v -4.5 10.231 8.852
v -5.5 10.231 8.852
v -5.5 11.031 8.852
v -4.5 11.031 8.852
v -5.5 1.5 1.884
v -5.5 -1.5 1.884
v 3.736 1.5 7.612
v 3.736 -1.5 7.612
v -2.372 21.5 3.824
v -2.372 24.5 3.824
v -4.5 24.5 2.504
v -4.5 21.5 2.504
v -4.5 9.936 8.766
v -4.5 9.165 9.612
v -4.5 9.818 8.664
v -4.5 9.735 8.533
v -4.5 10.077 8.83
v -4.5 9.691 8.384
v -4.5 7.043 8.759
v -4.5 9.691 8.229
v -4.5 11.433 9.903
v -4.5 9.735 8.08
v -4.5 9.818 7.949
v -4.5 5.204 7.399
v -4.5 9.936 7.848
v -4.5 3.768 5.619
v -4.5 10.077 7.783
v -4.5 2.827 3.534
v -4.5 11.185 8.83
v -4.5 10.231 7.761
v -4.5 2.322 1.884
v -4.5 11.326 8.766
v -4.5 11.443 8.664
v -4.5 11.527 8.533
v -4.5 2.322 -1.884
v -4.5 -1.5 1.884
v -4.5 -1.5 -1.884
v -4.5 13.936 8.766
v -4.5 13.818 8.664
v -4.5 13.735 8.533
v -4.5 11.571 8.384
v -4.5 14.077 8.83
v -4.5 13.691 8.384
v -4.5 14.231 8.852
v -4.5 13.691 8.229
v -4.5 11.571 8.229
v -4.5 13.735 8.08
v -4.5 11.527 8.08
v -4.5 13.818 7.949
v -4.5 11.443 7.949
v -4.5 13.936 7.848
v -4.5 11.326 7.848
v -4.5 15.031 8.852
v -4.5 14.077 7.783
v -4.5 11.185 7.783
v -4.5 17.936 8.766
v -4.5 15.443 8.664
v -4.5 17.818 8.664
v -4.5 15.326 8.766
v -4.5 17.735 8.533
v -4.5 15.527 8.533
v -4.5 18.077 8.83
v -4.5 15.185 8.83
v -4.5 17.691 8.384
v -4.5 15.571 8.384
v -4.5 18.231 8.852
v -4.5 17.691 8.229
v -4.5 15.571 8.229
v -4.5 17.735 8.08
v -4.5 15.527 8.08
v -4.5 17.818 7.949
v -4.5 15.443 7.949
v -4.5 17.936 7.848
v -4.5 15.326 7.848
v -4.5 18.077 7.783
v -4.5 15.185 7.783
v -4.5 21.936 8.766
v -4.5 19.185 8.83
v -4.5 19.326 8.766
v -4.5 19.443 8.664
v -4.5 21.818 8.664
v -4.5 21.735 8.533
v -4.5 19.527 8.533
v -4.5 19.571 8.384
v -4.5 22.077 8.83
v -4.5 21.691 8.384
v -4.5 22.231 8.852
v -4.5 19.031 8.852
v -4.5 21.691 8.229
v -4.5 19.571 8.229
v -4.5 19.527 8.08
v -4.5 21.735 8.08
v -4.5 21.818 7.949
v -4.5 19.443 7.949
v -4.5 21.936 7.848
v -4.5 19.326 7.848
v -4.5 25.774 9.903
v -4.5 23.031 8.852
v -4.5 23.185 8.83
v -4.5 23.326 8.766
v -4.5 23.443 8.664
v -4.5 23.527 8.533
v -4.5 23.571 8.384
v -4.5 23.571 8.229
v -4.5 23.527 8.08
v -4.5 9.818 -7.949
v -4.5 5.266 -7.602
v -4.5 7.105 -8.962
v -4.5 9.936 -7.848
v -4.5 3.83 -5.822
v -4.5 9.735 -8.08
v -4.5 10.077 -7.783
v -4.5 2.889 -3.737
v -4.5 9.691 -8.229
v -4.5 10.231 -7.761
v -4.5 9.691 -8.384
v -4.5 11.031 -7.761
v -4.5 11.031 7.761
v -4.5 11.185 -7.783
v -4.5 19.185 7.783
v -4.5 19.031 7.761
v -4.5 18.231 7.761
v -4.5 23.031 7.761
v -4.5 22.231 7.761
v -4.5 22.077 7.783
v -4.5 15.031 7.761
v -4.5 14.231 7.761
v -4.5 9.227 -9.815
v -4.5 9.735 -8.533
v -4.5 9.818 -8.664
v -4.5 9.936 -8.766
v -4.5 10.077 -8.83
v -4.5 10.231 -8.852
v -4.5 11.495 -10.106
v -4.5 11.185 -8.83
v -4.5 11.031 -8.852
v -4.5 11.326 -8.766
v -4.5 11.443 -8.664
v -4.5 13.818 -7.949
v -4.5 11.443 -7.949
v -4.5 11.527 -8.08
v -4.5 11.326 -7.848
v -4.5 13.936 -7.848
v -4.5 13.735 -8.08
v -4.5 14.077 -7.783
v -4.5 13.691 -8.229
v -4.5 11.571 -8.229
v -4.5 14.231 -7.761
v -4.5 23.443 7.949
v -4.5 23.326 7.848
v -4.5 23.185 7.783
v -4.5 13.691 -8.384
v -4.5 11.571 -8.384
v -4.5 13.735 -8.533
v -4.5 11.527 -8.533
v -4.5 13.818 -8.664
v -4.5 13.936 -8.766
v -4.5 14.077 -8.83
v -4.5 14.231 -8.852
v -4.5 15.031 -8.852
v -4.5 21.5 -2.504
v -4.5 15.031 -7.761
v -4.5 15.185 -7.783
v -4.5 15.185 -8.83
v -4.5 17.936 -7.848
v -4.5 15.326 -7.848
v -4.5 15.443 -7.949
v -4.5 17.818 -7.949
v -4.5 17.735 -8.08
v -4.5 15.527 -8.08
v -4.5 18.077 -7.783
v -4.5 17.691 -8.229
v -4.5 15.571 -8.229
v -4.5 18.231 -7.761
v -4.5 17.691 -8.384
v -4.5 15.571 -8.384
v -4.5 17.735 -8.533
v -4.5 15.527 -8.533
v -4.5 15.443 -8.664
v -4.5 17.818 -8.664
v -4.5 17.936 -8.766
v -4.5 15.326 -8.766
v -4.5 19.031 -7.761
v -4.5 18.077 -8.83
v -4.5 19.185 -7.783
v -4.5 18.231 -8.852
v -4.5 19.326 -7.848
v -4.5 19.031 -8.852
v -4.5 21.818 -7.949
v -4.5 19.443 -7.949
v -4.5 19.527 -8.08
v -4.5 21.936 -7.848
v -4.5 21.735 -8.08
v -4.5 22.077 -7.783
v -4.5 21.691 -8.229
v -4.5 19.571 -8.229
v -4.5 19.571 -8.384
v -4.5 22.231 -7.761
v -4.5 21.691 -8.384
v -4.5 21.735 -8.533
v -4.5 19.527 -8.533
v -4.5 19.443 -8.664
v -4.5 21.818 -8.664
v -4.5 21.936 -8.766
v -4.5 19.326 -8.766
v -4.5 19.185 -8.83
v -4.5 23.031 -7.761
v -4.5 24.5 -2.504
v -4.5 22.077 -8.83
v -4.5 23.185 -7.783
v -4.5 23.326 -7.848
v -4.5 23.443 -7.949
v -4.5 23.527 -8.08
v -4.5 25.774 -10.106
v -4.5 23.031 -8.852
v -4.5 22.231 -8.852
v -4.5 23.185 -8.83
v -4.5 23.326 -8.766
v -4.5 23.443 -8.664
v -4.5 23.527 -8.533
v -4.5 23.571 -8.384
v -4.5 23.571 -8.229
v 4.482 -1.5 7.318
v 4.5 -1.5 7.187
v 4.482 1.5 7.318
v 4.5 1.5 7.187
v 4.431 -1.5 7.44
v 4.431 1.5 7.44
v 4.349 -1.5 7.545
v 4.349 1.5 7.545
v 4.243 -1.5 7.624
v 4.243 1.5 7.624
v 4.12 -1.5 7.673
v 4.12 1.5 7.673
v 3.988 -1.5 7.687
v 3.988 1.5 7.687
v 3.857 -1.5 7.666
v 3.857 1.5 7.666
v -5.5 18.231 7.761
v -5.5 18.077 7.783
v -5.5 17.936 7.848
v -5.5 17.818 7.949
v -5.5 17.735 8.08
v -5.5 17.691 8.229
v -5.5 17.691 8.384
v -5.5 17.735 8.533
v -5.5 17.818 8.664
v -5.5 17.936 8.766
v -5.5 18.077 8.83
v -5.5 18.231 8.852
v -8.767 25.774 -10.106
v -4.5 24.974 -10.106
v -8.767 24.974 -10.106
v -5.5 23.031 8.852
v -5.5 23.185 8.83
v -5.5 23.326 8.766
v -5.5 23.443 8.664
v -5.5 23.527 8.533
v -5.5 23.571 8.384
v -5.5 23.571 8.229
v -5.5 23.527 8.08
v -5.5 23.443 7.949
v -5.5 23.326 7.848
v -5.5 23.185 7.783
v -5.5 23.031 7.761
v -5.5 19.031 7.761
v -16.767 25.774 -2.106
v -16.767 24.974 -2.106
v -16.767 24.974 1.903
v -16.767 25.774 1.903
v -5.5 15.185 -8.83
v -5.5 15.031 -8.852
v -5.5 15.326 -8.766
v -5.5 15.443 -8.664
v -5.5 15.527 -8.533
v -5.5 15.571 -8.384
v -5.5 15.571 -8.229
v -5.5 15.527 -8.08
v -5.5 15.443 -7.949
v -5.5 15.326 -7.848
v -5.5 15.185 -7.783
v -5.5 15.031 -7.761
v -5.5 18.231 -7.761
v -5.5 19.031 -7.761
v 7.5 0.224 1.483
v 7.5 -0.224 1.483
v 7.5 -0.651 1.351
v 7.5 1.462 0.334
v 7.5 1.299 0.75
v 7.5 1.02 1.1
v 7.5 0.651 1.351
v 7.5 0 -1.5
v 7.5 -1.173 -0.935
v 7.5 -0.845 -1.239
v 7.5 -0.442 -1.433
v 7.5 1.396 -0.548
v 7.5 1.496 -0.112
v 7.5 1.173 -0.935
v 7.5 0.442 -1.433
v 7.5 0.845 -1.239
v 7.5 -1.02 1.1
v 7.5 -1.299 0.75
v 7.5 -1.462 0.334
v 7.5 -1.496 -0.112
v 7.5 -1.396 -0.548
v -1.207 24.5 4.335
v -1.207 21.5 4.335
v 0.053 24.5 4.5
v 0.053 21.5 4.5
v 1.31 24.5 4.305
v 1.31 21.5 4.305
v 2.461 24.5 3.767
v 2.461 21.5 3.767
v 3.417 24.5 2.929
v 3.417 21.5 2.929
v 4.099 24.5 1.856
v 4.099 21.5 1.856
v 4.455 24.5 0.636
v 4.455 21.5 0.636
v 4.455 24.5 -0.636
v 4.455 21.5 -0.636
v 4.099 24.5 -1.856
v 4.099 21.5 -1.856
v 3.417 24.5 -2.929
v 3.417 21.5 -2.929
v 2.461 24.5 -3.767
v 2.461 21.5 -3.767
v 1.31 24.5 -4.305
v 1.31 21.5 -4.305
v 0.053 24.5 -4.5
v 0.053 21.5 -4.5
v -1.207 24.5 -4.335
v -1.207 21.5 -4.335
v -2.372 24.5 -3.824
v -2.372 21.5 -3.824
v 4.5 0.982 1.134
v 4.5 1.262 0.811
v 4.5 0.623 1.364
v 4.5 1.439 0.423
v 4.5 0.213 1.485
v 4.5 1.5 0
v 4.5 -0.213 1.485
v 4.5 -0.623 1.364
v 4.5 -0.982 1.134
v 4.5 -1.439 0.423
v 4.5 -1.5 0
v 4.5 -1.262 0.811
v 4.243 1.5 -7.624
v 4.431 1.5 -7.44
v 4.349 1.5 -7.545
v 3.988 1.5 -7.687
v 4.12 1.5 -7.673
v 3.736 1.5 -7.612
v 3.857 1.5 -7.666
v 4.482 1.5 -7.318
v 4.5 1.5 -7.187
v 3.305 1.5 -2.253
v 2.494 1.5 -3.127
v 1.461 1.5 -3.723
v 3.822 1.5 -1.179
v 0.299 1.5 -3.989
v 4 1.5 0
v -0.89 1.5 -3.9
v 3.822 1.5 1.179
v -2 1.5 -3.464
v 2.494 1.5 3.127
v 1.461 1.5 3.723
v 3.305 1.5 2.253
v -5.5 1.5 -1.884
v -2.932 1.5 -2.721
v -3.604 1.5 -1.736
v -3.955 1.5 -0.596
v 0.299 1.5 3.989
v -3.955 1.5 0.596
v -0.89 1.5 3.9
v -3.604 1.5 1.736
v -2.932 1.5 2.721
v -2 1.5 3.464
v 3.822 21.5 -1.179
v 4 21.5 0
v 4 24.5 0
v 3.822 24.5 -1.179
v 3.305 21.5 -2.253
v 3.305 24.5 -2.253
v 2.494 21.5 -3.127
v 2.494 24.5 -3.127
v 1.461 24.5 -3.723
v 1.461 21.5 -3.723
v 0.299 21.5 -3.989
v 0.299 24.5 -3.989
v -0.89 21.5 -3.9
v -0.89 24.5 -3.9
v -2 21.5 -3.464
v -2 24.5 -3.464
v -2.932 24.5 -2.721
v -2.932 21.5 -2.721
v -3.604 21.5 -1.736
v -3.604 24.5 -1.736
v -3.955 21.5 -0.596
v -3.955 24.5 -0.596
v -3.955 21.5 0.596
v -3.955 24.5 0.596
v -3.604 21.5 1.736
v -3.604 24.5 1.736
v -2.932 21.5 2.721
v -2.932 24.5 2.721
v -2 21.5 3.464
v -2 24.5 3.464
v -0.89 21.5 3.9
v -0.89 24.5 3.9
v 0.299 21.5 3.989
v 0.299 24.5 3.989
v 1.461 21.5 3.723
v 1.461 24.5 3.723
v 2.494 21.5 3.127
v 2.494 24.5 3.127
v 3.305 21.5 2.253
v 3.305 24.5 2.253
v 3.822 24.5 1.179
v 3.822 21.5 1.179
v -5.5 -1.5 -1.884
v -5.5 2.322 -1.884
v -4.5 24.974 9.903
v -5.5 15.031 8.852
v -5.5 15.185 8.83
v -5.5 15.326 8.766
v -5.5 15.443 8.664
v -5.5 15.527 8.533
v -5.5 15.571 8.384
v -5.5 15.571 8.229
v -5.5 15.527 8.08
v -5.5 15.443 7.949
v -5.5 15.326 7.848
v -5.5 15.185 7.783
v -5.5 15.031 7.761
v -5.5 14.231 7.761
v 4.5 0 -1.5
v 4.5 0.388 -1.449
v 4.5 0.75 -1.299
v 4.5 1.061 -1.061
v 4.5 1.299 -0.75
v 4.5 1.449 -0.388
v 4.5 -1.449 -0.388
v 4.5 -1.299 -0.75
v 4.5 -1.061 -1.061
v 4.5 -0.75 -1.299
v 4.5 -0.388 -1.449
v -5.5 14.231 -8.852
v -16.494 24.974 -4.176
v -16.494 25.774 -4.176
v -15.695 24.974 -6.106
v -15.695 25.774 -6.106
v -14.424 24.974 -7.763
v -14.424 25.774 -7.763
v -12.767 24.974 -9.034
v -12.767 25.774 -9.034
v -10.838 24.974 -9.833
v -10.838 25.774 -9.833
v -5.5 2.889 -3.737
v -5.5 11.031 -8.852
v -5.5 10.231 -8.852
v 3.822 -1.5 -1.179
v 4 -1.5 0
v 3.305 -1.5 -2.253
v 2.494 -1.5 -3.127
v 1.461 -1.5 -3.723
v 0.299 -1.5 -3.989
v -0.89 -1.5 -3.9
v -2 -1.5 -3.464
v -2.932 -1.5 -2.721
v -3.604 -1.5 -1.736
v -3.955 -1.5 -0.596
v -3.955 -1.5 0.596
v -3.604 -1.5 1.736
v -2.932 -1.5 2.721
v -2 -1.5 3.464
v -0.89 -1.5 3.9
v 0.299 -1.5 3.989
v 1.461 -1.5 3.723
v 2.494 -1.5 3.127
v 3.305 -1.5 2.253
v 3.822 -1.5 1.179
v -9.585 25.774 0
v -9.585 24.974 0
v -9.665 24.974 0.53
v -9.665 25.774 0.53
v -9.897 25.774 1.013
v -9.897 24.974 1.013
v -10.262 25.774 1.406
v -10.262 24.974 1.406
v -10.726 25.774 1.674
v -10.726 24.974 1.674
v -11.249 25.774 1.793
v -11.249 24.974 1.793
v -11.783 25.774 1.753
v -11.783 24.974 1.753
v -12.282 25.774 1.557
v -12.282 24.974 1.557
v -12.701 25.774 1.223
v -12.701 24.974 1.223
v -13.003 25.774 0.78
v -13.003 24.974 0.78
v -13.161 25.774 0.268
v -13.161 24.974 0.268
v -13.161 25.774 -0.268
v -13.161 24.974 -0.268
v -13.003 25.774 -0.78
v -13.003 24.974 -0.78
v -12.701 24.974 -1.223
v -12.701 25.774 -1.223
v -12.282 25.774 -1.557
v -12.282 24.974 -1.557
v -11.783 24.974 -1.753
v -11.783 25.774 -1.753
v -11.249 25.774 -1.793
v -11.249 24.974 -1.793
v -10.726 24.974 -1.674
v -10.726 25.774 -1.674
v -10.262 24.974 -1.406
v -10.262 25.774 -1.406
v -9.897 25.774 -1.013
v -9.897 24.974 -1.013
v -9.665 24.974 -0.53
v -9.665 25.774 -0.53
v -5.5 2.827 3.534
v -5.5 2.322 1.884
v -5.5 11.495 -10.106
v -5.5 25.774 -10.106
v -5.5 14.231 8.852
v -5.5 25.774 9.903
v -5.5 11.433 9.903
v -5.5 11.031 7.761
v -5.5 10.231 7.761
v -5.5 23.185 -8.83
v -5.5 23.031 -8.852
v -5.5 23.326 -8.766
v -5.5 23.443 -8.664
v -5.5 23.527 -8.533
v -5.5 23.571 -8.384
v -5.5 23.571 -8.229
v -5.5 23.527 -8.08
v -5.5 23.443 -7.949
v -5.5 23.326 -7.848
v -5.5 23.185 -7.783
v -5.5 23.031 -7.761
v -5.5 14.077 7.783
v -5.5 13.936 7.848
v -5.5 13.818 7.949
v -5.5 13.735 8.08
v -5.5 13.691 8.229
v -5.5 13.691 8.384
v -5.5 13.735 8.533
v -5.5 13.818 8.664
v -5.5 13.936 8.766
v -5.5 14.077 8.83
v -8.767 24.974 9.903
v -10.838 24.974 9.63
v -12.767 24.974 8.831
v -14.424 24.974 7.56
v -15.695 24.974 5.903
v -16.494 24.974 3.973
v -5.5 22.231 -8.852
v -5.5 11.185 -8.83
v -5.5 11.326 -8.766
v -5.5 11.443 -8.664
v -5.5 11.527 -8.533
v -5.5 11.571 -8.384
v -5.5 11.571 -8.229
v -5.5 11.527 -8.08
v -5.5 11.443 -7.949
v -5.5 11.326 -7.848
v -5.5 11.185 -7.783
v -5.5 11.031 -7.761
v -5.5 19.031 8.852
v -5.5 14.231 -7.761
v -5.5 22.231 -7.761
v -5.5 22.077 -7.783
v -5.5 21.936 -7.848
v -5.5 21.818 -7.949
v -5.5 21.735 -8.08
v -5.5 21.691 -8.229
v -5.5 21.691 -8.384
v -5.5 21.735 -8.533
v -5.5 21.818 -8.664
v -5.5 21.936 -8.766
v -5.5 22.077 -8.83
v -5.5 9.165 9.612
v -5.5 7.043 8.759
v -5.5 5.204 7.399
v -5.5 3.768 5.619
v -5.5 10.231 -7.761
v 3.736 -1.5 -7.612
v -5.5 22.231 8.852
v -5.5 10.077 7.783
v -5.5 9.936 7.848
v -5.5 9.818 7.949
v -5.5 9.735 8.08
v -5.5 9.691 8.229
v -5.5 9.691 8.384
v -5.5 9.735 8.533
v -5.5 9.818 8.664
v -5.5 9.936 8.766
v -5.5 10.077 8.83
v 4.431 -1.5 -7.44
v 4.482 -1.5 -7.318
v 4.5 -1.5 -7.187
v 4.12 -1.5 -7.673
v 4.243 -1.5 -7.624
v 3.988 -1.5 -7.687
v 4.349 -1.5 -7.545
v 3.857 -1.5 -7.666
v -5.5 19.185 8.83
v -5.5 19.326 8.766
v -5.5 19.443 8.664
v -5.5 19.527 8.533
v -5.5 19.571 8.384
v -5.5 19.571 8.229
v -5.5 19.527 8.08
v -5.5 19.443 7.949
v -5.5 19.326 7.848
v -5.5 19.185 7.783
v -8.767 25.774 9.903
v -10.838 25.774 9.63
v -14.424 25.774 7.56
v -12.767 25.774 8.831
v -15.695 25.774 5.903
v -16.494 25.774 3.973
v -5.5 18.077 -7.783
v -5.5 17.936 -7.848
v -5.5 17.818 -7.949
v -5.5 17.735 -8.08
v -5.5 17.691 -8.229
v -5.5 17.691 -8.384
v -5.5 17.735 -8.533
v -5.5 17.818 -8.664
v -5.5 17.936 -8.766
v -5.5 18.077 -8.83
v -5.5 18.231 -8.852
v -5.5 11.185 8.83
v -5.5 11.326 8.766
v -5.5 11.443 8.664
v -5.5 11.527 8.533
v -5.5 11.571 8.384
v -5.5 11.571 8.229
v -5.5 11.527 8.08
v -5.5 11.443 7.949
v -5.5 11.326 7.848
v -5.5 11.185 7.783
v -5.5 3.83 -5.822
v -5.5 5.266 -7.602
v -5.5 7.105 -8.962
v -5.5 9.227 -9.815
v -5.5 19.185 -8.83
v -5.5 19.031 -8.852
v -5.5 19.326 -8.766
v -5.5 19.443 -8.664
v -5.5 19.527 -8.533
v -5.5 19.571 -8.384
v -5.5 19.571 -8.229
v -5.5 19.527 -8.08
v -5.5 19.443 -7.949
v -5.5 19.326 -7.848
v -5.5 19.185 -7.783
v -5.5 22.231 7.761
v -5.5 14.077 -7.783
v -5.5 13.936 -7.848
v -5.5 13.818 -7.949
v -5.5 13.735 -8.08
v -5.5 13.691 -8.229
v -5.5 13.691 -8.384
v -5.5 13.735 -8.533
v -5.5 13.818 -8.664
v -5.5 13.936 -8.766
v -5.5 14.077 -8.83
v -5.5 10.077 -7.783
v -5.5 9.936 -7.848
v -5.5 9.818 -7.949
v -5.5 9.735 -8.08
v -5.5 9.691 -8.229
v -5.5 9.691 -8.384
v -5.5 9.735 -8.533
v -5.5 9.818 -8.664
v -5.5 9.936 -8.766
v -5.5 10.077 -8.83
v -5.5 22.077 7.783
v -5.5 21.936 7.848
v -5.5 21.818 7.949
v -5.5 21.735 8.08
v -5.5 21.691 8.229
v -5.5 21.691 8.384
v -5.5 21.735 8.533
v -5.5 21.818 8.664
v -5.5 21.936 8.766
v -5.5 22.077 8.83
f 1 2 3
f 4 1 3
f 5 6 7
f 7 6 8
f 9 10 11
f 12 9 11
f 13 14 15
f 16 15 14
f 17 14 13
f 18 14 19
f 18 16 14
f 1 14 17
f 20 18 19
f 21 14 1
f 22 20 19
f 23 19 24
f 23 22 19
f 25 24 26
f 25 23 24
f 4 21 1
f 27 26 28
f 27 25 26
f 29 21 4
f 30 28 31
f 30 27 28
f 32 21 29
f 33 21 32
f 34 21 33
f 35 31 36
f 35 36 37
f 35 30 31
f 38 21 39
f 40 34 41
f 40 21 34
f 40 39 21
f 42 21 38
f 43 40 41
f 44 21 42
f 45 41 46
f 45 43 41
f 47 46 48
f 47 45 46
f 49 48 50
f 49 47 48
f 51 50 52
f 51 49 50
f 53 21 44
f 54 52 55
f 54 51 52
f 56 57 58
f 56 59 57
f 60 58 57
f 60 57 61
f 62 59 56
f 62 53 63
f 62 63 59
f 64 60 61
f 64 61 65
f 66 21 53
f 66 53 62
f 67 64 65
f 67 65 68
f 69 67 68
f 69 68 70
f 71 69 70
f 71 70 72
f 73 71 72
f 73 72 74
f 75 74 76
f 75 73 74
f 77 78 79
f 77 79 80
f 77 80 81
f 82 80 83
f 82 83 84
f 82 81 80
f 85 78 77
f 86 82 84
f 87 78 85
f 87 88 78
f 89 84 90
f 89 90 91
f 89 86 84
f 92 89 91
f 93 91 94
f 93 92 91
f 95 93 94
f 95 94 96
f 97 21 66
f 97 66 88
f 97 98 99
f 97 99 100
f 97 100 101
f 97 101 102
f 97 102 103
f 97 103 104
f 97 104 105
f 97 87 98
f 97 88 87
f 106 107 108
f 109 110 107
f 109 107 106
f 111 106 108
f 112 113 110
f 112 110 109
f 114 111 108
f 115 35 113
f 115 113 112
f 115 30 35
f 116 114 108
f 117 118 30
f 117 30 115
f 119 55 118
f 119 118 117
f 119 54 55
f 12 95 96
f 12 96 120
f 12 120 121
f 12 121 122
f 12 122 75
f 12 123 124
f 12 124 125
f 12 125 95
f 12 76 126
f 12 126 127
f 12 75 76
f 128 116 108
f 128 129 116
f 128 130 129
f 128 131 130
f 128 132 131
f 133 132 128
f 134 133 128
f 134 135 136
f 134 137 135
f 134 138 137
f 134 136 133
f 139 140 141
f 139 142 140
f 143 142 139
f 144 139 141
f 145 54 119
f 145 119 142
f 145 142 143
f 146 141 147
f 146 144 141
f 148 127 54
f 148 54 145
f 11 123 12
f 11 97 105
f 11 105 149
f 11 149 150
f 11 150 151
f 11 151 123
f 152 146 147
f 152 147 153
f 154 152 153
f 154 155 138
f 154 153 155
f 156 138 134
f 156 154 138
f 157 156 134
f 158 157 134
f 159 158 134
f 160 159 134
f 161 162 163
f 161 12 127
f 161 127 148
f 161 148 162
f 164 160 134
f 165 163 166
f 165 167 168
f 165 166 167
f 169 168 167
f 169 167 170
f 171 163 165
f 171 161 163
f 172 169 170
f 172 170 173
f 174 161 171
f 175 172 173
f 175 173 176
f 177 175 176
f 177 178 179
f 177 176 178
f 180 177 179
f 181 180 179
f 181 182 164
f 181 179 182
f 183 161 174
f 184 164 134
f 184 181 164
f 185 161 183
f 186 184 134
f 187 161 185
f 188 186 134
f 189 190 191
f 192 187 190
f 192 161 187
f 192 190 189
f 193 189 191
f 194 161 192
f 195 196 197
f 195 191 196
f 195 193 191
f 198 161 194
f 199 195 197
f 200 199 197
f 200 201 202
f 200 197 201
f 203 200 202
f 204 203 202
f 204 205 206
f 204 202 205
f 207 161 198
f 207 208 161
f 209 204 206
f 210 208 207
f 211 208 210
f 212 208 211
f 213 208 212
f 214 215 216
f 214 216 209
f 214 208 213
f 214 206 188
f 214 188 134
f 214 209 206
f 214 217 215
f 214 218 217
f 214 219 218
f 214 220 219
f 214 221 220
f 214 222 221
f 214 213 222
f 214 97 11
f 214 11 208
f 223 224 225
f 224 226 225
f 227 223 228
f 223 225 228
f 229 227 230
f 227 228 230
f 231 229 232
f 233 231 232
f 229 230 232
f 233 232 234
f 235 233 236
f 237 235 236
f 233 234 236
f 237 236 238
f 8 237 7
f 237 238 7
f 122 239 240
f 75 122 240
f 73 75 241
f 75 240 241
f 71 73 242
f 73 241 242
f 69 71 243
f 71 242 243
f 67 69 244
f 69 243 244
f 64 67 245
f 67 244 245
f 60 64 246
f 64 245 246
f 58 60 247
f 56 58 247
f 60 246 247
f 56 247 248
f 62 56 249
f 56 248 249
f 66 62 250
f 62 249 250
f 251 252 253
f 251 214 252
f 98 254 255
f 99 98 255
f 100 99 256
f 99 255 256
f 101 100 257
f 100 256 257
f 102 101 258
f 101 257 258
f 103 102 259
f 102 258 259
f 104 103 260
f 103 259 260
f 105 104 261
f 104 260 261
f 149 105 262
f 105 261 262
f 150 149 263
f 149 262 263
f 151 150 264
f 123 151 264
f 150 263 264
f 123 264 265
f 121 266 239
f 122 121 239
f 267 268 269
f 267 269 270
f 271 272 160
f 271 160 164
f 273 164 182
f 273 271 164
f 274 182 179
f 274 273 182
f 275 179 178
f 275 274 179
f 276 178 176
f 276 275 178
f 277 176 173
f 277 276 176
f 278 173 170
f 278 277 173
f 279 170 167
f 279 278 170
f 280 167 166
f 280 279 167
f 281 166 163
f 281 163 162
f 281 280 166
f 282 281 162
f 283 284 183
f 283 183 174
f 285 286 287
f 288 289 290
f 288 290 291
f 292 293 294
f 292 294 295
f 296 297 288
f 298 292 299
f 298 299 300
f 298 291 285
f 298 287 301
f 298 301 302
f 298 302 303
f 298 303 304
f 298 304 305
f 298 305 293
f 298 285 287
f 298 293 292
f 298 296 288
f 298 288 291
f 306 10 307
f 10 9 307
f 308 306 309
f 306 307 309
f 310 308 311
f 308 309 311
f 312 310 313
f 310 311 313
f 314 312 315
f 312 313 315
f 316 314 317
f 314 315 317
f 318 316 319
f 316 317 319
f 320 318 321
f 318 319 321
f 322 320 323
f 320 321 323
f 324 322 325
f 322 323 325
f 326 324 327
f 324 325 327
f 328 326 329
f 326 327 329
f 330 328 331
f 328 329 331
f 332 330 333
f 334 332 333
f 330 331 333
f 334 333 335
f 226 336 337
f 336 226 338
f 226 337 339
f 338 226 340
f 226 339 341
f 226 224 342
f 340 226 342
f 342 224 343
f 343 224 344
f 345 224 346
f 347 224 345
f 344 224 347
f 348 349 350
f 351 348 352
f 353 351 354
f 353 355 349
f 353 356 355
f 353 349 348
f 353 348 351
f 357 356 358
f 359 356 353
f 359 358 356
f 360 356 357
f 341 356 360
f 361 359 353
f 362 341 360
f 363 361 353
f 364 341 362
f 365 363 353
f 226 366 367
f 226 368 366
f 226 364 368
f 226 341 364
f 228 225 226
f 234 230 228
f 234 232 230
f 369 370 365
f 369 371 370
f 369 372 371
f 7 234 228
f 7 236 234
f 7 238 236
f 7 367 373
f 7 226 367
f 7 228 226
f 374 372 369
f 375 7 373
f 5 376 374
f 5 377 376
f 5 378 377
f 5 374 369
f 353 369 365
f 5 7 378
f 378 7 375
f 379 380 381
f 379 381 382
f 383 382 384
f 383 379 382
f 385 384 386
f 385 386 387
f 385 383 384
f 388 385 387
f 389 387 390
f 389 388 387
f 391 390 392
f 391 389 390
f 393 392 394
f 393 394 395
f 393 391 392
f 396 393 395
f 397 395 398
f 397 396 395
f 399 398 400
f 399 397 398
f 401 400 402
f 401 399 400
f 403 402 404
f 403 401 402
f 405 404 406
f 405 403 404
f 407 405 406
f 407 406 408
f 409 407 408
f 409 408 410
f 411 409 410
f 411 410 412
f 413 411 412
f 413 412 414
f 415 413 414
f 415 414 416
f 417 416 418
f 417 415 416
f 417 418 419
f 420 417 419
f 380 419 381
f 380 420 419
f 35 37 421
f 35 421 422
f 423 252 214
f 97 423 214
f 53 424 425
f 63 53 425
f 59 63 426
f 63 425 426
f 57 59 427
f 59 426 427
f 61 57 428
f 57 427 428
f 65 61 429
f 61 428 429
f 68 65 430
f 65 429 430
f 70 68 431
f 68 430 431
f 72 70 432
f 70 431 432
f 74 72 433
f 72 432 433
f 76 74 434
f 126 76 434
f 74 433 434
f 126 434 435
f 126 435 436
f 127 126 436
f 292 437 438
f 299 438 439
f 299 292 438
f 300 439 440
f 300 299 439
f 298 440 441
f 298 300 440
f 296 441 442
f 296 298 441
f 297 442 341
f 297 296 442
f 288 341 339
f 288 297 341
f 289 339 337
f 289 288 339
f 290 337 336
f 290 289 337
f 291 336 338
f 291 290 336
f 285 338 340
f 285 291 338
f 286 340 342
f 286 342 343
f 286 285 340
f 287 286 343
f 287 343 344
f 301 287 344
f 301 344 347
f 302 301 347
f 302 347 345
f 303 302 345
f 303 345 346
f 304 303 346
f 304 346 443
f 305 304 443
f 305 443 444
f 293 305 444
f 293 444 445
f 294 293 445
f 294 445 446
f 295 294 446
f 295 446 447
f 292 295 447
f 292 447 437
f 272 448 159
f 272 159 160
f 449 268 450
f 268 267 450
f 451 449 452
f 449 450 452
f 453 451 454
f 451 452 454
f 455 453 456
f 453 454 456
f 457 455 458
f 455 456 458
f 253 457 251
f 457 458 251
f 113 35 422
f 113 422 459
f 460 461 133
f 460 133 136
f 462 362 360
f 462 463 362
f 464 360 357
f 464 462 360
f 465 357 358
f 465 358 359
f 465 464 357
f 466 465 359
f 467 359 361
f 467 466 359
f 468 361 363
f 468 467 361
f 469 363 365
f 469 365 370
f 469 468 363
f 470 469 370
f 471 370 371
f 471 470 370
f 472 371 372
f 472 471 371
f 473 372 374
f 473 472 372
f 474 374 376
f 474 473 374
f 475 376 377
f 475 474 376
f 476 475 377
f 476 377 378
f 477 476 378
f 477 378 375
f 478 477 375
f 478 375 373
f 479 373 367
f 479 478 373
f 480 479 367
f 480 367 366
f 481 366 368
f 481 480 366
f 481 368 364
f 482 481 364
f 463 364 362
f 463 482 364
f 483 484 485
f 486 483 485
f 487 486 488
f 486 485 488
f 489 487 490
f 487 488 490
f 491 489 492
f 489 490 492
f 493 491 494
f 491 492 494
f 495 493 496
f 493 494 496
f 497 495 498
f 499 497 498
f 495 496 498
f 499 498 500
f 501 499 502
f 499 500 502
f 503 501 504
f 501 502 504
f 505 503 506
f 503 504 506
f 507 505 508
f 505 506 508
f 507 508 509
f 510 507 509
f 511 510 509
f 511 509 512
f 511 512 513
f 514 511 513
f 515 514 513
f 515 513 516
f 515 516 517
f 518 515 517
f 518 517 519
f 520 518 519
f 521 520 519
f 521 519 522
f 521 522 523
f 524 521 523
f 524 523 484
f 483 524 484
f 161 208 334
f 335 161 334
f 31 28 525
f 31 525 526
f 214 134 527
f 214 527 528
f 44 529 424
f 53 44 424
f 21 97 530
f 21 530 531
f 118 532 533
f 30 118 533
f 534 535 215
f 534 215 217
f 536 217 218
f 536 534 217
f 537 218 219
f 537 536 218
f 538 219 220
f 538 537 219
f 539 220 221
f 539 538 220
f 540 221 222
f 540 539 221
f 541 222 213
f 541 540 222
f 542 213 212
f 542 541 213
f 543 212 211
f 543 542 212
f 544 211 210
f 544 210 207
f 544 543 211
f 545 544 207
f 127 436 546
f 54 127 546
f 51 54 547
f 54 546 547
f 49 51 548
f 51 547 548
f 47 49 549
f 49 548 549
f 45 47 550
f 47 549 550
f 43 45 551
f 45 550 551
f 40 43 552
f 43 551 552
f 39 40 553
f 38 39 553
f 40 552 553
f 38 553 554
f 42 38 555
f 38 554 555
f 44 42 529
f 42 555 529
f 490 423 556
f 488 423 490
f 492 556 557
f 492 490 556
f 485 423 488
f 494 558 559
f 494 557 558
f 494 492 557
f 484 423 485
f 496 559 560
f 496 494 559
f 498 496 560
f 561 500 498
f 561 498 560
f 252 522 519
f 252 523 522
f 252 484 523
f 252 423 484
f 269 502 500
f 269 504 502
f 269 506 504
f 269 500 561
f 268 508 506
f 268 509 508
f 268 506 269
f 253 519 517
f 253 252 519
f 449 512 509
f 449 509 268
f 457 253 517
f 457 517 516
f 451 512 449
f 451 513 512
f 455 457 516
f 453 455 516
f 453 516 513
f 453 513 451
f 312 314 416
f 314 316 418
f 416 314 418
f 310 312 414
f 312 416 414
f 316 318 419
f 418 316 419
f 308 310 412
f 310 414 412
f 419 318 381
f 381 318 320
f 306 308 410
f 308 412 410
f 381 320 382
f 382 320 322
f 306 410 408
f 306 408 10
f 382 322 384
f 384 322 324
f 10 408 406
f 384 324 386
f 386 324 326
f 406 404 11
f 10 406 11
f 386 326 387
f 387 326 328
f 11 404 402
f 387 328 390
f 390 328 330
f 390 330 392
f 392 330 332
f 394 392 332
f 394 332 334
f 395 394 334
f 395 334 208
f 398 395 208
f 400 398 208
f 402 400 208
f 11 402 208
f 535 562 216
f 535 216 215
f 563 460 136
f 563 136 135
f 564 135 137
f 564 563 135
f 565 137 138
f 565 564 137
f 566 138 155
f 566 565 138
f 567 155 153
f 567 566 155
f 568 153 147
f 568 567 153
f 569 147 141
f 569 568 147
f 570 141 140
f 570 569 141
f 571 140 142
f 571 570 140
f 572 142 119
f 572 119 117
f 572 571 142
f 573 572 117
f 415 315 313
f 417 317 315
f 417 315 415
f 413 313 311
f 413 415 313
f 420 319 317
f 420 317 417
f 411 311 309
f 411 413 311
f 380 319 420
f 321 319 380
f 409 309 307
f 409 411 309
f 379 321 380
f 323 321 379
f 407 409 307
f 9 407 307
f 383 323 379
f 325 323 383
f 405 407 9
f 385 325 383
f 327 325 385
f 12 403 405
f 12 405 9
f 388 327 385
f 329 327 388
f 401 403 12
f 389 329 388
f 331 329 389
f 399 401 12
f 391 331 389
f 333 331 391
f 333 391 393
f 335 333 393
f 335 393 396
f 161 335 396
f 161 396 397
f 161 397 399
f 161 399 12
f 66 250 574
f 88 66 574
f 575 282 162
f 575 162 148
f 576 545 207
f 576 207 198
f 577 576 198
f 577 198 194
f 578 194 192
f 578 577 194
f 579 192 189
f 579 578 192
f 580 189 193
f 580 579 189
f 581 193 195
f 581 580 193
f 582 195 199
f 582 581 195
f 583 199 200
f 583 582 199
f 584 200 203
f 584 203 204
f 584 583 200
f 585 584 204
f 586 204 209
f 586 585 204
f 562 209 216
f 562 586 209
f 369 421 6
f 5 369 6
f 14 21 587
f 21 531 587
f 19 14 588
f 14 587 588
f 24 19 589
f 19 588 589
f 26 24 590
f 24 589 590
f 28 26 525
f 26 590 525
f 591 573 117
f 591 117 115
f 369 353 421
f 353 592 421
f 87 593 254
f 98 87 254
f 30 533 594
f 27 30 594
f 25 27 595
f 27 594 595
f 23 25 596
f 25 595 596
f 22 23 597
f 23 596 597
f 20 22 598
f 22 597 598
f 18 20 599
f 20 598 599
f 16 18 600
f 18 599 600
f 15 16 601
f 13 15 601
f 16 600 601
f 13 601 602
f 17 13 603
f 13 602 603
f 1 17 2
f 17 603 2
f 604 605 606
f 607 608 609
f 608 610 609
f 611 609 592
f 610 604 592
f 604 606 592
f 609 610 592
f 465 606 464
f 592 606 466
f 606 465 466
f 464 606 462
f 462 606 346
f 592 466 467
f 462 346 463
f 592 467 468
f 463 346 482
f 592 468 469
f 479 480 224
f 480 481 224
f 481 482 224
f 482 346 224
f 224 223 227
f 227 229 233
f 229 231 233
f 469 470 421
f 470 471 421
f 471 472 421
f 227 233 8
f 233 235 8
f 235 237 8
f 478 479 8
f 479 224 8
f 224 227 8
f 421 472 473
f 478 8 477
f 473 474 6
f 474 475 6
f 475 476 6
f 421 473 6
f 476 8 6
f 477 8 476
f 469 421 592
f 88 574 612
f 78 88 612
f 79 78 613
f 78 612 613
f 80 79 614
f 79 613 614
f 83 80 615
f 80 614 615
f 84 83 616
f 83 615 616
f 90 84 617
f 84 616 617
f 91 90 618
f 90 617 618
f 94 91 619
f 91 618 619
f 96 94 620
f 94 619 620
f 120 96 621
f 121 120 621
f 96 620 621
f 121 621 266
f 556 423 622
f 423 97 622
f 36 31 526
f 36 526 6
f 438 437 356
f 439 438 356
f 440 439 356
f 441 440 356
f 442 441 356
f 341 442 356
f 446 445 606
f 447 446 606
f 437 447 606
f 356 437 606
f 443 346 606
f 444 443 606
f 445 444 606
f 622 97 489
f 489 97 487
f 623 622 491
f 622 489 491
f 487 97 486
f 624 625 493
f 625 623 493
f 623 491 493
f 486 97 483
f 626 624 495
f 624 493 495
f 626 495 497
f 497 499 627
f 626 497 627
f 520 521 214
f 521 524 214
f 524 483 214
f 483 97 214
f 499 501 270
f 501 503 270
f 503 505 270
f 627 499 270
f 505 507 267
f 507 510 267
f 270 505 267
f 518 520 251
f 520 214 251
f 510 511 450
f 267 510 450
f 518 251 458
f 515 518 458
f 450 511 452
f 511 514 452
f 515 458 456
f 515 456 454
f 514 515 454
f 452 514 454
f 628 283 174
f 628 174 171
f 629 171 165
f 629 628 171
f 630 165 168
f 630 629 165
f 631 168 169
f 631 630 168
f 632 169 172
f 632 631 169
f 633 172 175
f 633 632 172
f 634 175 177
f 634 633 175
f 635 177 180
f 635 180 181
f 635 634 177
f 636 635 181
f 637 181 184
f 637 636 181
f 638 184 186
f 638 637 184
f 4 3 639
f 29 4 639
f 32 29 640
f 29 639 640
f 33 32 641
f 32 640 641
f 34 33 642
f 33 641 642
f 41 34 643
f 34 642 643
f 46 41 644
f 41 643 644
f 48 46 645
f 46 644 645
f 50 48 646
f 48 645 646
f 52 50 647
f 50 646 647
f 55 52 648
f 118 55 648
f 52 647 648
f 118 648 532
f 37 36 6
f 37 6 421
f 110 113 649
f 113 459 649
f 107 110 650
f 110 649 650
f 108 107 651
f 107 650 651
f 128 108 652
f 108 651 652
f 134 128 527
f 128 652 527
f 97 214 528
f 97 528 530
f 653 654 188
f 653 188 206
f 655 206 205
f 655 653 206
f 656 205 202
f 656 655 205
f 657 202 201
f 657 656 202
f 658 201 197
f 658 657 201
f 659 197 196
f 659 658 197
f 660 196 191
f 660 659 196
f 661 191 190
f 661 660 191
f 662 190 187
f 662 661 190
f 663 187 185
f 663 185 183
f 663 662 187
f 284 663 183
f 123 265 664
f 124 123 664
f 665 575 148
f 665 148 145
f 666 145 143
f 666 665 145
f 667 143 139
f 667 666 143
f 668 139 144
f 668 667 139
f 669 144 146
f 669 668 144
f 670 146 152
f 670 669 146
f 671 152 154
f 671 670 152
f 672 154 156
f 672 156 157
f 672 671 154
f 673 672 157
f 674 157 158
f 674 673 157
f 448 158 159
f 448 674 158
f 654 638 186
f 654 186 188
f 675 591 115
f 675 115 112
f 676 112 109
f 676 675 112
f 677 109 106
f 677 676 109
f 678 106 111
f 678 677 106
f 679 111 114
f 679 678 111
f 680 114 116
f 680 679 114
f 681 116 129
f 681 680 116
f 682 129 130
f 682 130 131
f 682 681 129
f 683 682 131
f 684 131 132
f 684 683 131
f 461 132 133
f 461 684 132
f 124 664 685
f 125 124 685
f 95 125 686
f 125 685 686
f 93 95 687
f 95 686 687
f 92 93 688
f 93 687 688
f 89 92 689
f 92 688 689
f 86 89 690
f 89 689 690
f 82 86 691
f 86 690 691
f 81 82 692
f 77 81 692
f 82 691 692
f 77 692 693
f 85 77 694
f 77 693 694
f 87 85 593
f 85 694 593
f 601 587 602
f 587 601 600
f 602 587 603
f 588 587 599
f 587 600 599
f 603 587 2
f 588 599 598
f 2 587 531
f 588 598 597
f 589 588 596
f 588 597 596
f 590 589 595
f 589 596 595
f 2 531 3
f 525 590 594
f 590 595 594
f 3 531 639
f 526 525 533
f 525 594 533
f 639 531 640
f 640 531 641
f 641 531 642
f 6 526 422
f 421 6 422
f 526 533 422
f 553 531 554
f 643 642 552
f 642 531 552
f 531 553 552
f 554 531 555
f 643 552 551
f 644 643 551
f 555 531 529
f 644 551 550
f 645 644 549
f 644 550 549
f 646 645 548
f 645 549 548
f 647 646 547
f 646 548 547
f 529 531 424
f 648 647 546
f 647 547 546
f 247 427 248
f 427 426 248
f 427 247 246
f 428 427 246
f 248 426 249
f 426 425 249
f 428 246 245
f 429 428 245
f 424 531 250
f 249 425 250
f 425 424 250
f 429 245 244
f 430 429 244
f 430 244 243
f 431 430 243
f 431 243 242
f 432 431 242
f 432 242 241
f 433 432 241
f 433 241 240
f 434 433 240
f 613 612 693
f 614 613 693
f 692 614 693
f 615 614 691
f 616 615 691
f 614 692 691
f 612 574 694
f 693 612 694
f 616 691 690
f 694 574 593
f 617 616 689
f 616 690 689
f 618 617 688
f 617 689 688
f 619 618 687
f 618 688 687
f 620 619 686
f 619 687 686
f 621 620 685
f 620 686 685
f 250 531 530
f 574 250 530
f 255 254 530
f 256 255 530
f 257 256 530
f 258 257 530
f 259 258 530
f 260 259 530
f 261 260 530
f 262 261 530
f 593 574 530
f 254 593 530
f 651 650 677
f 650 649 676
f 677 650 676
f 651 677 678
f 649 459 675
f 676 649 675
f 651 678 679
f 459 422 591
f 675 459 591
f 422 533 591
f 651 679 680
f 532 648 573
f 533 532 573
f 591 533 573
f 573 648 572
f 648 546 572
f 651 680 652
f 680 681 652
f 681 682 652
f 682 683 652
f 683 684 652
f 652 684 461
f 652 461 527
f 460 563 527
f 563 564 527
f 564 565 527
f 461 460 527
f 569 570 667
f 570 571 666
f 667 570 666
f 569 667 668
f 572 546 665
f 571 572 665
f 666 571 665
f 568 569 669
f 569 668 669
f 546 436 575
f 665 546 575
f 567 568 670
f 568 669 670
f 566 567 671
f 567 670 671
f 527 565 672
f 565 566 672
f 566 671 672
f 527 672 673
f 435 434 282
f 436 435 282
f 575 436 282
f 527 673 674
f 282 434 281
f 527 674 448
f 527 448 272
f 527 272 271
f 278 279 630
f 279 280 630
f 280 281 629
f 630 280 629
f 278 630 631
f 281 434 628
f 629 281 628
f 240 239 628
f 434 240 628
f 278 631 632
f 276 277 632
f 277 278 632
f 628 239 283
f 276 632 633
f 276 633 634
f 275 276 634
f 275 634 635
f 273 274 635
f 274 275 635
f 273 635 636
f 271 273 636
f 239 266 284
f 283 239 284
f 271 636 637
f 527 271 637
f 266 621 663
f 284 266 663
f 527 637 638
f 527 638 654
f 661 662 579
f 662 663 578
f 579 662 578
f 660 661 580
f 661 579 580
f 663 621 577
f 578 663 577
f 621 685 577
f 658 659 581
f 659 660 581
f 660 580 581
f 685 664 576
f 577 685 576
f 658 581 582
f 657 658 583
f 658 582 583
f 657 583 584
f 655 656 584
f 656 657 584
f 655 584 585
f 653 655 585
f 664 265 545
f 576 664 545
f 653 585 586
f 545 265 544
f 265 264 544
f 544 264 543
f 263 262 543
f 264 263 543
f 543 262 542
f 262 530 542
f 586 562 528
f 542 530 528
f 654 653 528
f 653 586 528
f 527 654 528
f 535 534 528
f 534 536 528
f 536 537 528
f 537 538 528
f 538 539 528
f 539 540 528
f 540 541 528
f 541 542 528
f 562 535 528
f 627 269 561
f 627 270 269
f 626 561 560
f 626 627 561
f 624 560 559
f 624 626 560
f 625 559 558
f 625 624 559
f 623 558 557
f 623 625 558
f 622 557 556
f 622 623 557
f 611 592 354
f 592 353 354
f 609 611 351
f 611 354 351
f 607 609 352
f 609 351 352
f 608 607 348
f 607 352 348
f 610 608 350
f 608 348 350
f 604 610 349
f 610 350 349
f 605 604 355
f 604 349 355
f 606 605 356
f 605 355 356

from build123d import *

# Parameters (mm, degrees)
SKETCH1_R              = 4.5
SKETCH1_R_2            = 4
BOSS_EXTRUDE1_DEPTH    = 1.5
BOSS_EXTRUDE2_REACH    = 14
SKETCH4_R              = 1.5
BOSS_EXTRUDE3_DEPTH    = 1
FILLET1_R              = 9
CUT_EXTRUDE1_DEPTH     = 1
LPATTERN1_COUNT        = 4
LPATTERN1_PITCH        = 4
LPATTERN1_COPY_1_DEPTH = 1
LPATTERN1_COPY_2_DEPTH = 1
LPATTERN1_COPY_3_DEPTH = 1
SKETCH8_W              = 12.26701151
SKETCH8_H              = 0.8
BOSS_EXTRUDE4_DEPTH    = 20.008657
FILLET3_R              = 8
SKETCH9_R              = 4
BOSS_EXTRUDE5_DEPTH    = 3
FILLET5_R              = 0.5
SKETCH11_R             = 4.5
SKETCH11_R_2           = 4
BOSS_EXTRUDE6_DEPTH    = 3
BOSS_EXTRUDE7_DEPTH    = 3
SKETCH10_R             = 1.798339867
CUT_EXTRUDE3_DEPTH     = 1


with BuildPart() as part:
    # Sketch1 → Boss-Extrude1 (new body, symmetric)
    with BuildSketch(Plane(origin=(0, 0, 0), x_dir=(1, 0, 0), z_dir=(0, 1, 0))):
        Circle(SKETCH1_R)
        Circle(SKETCH1_R_2, mode=Mode.SUBTRACT)
    extrude(amount=BOSS_EXTRUDE1_DEPTH, both=True)

    # Sketch4 → Boss-Extrude2 (add, up to next)
    with BuildSketch(Plane(origin=(7.5, 0, 0), x_dir=(0, 0, -1), z_dir=(1, 0, 0)), mode=Mode.PRIVATE) as boss_extrude2_sk1:
        Circle(SKETCH4_R)
    boss_extrude2_tool1 = extrude(boss_extrude2_sk1.sketch, amount=-BOSS_EXTRUDE2_REACH, mode=Mode.PRIVATE) - part.part
    add(boss_extrude2_tool1.solids().sort_by_distance((7.5, 0, 0))[0])

    # Sketch9 → Boss-Extrude5 (add)
    with BuildSketch(Plane.XZ.offset(1.5)):
        Polygon((4.5, 8.085472141), (4.5, -8.085472141), (-5.5, -1.884383055), (-5.5, 1.884383055), align=None)
        Circle(SKETCH9_R, mode=Mode.SUBTRACT)
    extrude(amount=-BOSS_EXTRUDE5_DEPTH)

    # Fillet5
    fillet5_edges = [part.edges().sort_by_distance(p)[0] for p in [
        (4.5, 0, -8.085472141),
        (4.5, 0, 8.085472141),
    ]]
    fillet(fillet5_edges, radius=FILLET5_R)


with BuildPart() as body_2:
    # Sketch6 → Boss-Extrude3 (new body)
    with BuildSketch(Plane(origin=(-4.5, 0, 0), x_dir=(0, 0, -1), z_dir=(1, 0, 0))):
        Polygon((1.884383055, -1.5), (1.884383055, 2.322252785), (10.105735978, 4.835772616), (10.105735978, 25.773765949), (-9.90292131, 25.773765949), (-9.90292131, 4.773765949), (-1.884383055, 2.322252785), (-1.884383055, -1.5), align=None)
    extrude(amount=-BOSS_EXTRUDE3_DEPTH)

    # Fillet1
    fillet1_edges = [body_2.edges().sort_by_distance(p)[0] for p in [
        (-5, 4.773765949, 9.90292131),
        (-5, 4.835772616, -10.105735978),
    ]]
    fillet(fillet1_edges, radius=FILLET1_R)

    # Sketch7 → Cut-Extrude1 (cut)
    with BuildSketch(Plane.ZY.offset(5.5)):
        with BuildLine():
            Line((-7.761048452, 23.030820996), (-7.761048452, 22.230820996))
            ThreePointArc((-7.761048452, 22.230820996), (-8.306666723, 21.685202725), (-8.852284995, 22.230820996))
            Line((-8.852284995, 22.230820996), (-8.852284995, 23.030820996))
            ThreePointArc((-8.852284995, 23.030820996), (-8.306666723, 23.576439267), (-7.761048452, 23.030820996))
        make_face()
    cut_extrude1 = extrude(amount=-CUT_EXTRUDE1_DEPTH, mode=Mode.SUBTRACT)

    # Mirror1: Cut-Extrude1 across plane
    add(cut_extrude1.mirror(Plane.XY), mode=Mode.SUBTRACT)

    # LPattern1: Cut-Extrude1 ×4
    with Locations(*[(0, -i * LPATTERN1_PITCH, 0) for i in range(1, LPATTERN1_COUNT)]):
        add(cut_extrude1, mode=Mode.SUBTRACT)

    # LPattern1 copy 1 sketch → LPattern1 copy 1 (cut)
    with BuildSketch(Plane(origin=(-5.5, -4, 0), x_dir=(0, 0, -1), z_dir=(-1, 0, 0))):
        with BuildLine():
            Line((-7.761048452, -23.030820996), (-7.761048452, -22.230820996))
            ThreePointArc((-7.761048452, -22.230820996), (-8.306666723, -21.685202725), (-8.852284995, -22.230820996))
            Line((-8.852284995, -22.230820996), (-8.852284995, -23.030820996))
            ThreePointArc((-8.852284995, -23.030820996), (-8.306666723, -23.576439267), (-7.761048452, -23.030820996))
        make_face()
    extrude(amount=-LPATTERN1_COPY_1_DEPTH, mode=Mode.SUBTRACT)

    # LPattern1 copy 2 sketch → LPattern1 copy 2 (cut)
    with BuildSketch(Plane(origin=(-5.5, -8, 0), x_dir=(0, 0, -1), z_dir=(-1, 0, 0))):
        with BuildLine():
            Line((-7.761048452, -23.030820996), (-7.761048452, -22.230820996))
            ThreePointArc((-7.761048452, -22.230820996), (-8.306666723, -21.685202725), (-8.852284995, -22.230820996))
            Line((-8.852284995, -22.230820996), (-8.852284995, -23.030820996))
            ThreePointArc((-8.852284995, -23.030820996), (-8.306666723, -23.576439267), (-7.761048452, -23.030820996))
        make_face()
    extrude(amount=-LPATTERN1_COPY_2_DEPTH, mode=Mode.SUBTRACT)

    # LPattern1 copy 3 sketch → LPattern1 copy 3 (cut)
    with BuildSketch(Plane(origin=(-5.5, -12, 0), x_dir=(0, 0, -1), z_dir=(-1, 0, 0))):
        with BuildLine():
            Line((-7.761048452, -23.030820996), (-7.761048452, -22.230820996))
            ThreePointArc((-7.761048452, -22.230820996), (-8.306666723, -21.685202725), (-8.852284995, -22.230820996))
            Line((-8.852284995, -22.230820996), (-8.852284995, -23.030820996))
            ThreePointArc((-8.852284995, -23.030820996), (-8.306666723, -23.576439267), (-7.761048452, -23.030820996))
        make_face()
    extrude(amount=-LPATTERN1_COPY_3_DEPTH, mode=Mode.SUBTRACT)



with BuildPart() as body_3:
    # Sketch8 → Boss-Extrude4 (new body)
    with BuildSketch(Plane(origin=(0, 0, -10.105735978), x_dir=(-1, 0, 0), z_dir=(0, 0, -1))):
        with Locations((10.633505755, 25.373765949)):
            Rectangle(SKETCH8_W, SKETCH8_H)
    extrude(amount=-BOSS_EXTRUDE4_DEPTH)

    # Fillet3
    fillet3_edges = [body_3.edges().sort_by_distance(p)[0] for p in [
        (-16.76701151, 25.373765949, -10.105735978),
        (-16.76701151, 25.373765949, 9.902921022),
    ]]
    fillet(fillet3_edges, radius=FILLET3_R)

    # Sketch10 → Cut-Extrude3 (cut)
    with BuildSketch(Plane.XZ.offset(-24.973765949)):
        with Locations((-11.383014104, 0)):
            Circle(SKETCH10_R)
    extrude(amount=-CUT_EXTRUDE3_DEPTH, mode=Mode.SUBTRACT)


with BuildPart() as body_4:
    # Sketch11 → Boss-Extrude6 (new body)
    with BuildSketch(Plane(origin=(0, 21.5, 0), x_dir=(1, 0, 0), z_dir=(0, 1, 0))):
        Circle(SKETCH11_R)
        Circle(SKETCH11_R_2, mode=Mode.SUBTRACT)
    extrude(amount=BOSS_EXTRUDE6_DEPTH)


with BuildPart() as body_2_1:
    add(body_2.part)

    add(body_4.part)  # Boss-Extrude7 merges body 4
    # Sketch13 → Boss-Extrude7 (add)
    with BuildSketch(Plane(origin=(0, 24.5, 0), x_dir=(1, 0, 0), z_dir=(0, 1, 0))):
        with BuildLine():
            Line((-5.5, 1.884383055), (-2.37152936, 3.824375569))
            ThreePointArc((-2.37152936, 3.824375569), (-4.5, 0), (-2.37152936, -3.824375569))
            Line((-2.37152936, -3.824375569), (-5.5, -1.884383055))
            Line((-5.5, -1.884383055), (-5.5, 1.884383055))
        make_face()
    extrude(amount=-BOSS_EXTRUDE7_DEPTH)


solid = Compound([part.part, body_3.part, body_2_1.part])
